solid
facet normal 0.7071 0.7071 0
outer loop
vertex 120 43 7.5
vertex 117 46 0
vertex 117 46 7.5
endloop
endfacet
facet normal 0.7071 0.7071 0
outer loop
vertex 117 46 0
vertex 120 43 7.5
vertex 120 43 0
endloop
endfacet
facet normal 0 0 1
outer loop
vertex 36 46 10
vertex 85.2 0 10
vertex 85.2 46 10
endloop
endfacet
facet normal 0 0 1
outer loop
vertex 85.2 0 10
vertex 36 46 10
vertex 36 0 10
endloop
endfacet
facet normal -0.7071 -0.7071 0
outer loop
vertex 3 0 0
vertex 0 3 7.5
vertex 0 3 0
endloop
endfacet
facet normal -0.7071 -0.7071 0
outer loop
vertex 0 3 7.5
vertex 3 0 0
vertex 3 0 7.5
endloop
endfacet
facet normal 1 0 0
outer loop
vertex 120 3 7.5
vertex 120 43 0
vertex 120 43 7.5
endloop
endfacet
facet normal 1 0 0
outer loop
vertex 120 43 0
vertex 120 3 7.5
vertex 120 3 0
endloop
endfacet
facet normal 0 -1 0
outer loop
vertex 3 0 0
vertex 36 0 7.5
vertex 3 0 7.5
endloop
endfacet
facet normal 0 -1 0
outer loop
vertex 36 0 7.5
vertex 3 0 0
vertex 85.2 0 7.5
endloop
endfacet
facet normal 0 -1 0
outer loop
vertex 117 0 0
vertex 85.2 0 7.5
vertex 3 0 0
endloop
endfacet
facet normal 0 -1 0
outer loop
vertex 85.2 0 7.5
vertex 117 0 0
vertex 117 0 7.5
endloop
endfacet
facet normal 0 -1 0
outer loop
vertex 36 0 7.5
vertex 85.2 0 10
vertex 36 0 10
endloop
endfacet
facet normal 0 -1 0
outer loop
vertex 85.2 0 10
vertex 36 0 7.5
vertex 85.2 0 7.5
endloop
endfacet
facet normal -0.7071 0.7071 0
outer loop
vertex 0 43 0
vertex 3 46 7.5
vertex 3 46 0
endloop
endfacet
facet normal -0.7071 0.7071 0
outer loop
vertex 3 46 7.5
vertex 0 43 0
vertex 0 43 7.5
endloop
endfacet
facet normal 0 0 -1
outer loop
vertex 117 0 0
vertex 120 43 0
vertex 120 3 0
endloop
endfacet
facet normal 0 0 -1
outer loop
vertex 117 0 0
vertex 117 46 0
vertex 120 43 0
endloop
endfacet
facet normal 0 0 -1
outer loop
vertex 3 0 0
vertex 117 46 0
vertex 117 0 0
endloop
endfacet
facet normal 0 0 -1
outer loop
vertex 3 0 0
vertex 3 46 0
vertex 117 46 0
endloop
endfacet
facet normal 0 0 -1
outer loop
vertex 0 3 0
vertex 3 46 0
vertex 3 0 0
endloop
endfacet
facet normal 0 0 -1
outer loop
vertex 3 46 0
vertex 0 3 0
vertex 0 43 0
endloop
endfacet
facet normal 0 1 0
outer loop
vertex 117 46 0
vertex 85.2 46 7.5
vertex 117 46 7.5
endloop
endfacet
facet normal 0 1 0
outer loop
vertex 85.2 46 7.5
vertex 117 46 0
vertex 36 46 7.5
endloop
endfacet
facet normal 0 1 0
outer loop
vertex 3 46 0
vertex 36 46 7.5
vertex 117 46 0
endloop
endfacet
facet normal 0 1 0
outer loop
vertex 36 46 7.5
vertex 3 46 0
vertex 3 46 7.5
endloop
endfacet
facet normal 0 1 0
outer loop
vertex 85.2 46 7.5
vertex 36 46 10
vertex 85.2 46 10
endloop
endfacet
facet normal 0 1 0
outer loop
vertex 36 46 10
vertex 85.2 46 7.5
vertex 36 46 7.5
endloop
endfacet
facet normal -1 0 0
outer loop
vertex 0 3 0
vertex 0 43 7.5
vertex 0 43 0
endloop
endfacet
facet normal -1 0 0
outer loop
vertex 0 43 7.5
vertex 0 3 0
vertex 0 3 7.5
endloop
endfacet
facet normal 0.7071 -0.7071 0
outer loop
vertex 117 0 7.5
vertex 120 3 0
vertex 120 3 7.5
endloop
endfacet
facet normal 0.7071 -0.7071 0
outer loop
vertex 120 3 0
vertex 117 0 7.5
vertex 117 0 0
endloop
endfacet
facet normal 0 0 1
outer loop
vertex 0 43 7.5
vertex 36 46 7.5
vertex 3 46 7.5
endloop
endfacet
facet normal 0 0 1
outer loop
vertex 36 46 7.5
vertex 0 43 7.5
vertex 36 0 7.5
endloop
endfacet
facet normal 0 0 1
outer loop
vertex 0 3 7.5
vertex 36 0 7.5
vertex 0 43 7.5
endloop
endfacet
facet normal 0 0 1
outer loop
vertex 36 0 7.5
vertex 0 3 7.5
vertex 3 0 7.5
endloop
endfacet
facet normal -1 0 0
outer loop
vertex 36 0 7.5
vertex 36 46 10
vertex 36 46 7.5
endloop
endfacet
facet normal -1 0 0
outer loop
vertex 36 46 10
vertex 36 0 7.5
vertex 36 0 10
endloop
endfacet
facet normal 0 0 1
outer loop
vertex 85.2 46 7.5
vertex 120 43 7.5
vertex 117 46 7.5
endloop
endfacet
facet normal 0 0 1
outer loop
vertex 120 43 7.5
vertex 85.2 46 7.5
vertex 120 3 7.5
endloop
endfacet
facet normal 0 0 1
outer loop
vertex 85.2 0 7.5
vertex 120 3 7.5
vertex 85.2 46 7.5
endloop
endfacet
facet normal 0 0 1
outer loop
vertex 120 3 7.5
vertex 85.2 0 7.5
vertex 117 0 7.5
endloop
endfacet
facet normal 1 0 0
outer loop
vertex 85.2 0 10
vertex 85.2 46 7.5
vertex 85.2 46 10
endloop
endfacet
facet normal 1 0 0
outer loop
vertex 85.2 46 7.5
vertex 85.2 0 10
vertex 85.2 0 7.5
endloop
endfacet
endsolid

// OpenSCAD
$fn = 32;

// ----------------------------------------------------------------------
// Stepped bar: centerstep, 120 x 46 x 10/7.5 mm
// ----------------------------------------------------------------------

// --- parameters (mm) ---
bar_l = 120;              // bar length, X
bar_w = 46;               // bar width, Y
plate_t = 10;             // thickness of the thick zone, Z
thin_t = 7.5;             // thickness of the thin zone
corner_c = 3;             // corner chamfer of the bar
step_cut = 2.5;           // material removed from the thin zone
thick_from = 36;          // start of the thick middle zone
thick_to = 85.2;          // end of the thick middle zone
depth_1 = 2.5;            // depth of cut 1 from the top face
depth_2 = 2.5;            // depth of cut 2 from the top face

profile = [[3, 0], [117, 0], [120, 3], [120, 43], [117, 46], [3, 46], [0, 43], [0, 3]];  // primary outline, 8 points, counter clockwise
void_1 = [[-1, -1], [36, -1], [36, 47], [-1, 47]];  // thin left end, 4 points
void_2 = [[85.2, -1], [121, -1], [121, 47], [85.2, 47]];  // thin right end, 4 points

// --- the one profile operation ---
difference() {
  linear_extrude(height = plate_t) polygon(points = profile);
  translate([0, 0, plate_t - depth_1])
    linear_extrude(height = depth_1 + 1) polygon(points = void_1);
  translate([0, 0, plate_t - depth_2])
    linear_extrude(height = depth_2 + 1) polygon(points = void_2);
}
